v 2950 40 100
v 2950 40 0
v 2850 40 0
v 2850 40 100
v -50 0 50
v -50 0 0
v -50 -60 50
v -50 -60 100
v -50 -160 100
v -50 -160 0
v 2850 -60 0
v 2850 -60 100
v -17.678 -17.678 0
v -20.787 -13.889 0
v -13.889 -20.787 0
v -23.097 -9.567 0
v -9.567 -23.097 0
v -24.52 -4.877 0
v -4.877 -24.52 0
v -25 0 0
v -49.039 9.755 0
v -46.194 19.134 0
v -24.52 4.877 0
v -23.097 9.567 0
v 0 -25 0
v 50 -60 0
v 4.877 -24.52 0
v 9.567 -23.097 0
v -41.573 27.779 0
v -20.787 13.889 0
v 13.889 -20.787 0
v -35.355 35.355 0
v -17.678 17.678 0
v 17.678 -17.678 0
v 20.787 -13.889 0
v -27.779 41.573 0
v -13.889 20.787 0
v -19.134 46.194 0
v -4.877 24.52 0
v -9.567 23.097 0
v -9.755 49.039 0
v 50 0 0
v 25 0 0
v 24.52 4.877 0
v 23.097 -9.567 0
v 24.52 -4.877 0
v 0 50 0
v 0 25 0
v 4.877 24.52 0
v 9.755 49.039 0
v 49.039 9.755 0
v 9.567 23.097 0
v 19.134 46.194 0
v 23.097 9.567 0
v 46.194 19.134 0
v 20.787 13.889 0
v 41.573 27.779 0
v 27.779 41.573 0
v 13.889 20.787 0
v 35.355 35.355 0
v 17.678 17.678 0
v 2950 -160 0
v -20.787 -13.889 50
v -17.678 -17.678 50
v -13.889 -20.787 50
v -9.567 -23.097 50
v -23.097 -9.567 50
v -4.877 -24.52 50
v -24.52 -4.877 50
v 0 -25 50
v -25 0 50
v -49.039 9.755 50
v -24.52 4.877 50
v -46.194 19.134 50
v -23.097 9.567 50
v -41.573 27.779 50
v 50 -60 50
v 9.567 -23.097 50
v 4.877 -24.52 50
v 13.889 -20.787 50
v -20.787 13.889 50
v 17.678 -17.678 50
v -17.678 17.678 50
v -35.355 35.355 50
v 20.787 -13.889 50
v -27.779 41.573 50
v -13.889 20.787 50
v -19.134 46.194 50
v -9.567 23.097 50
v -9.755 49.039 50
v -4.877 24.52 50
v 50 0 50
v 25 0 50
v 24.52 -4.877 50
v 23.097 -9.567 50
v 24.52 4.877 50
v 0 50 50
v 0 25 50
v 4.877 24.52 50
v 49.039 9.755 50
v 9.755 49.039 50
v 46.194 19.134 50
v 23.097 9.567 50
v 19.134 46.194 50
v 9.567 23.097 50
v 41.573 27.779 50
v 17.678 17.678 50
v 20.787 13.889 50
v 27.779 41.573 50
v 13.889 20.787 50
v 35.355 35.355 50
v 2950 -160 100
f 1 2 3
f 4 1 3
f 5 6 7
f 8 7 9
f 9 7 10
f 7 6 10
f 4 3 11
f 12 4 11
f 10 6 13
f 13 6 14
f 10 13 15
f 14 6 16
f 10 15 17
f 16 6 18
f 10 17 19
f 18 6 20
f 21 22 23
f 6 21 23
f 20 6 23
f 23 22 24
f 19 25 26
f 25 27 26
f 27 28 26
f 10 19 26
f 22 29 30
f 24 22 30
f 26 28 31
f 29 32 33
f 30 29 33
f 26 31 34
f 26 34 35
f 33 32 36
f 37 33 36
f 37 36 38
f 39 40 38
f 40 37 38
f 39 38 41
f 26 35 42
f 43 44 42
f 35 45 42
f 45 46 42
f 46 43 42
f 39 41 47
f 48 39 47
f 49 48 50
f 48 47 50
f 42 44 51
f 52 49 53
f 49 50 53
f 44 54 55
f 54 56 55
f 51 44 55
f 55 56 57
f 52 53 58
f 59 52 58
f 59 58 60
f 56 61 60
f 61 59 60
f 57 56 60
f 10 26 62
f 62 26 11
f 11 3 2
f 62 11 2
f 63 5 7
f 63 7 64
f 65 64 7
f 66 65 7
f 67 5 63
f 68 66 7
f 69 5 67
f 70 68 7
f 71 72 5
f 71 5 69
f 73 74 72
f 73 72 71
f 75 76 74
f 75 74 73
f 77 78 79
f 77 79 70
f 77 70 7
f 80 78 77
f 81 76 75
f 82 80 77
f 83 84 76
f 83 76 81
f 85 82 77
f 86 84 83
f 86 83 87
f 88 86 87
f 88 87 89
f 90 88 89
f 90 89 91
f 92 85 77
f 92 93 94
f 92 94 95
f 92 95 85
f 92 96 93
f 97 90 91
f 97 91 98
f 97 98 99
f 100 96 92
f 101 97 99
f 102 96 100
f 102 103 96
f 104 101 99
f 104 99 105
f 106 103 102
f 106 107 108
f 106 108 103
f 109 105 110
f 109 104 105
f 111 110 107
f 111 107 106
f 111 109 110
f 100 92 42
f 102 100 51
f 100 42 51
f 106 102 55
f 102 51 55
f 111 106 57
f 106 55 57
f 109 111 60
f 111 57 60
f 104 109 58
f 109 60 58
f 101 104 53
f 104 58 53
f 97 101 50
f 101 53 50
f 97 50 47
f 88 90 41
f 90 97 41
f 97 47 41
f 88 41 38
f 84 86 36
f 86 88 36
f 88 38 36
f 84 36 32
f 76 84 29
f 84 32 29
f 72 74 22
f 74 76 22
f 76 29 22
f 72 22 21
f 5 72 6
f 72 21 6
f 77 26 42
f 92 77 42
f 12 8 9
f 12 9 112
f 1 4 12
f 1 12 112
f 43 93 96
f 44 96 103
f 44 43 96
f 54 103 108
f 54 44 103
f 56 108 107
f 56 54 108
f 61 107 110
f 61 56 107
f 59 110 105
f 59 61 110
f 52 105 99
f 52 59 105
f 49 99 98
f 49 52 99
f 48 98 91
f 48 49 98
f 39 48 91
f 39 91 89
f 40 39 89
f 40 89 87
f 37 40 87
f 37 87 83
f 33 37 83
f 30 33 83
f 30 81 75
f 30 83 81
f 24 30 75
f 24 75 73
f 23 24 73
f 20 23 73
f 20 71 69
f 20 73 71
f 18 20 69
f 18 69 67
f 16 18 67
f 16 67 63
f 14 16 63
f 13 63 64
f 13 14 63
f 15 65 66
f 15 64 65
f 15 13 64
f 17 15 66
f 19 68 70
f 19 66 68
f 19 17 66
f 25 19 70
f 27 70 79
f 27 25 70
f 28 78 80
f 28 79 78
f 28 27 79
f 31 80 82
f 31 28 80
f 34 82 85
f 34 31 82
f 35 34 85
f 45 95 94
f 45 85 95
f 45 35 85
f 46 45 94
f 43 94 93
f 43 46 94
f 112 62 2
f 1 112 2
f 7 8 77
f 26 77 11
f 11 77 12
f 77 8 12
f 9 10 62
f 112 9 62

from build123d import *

# Parameters (mm, degrees)
SKETCH_1_R          = 25
EXTRUDE_1_DEPTH     = 100
SKETCH_2_W          = 140.942961324
SKETCH_2_H          = 134.262185151
CUT_EXTRUDE_1_DEPTH = 50


with BuildPart() as part:
    # 草图1 → 拉伸1 (new body)
    with BuildSketch(Plane.XY):
        with BuildLine():
            Line((-50, -160), (2950, -160))
            Line((2950, -160), (2950, 40))
            Line((2950, 40), (2850, 40))
            Line((2850, 40), (2850, -60))
            Line((2850, -60), (50, -60))
            Line((50, -60), (50, 0))
            ThreePointArc((50, 0), (0, 50), (-50, 0))
            Line((-50, 0), (-50, -160))
        make_face()
        Circle(SKETCH_1_R, mode=Mode.SUBTRACT)
    extrude(amount=EXTRUDE_1_DEPTH)

    # 草图2 → 切除-拉伸1 (cut)
    with BuildSketch(Plane.XY.offset(100)):
        with Locations((-20.471480662, 7.131092576)):
            Rectangle(SKETCH_2_W, SKETCH_2_H)
    extrude(amount=-CUT_EXTRUDE_1_DEPTH, mode=Mode.SUBTRACT)


solid = part.part
